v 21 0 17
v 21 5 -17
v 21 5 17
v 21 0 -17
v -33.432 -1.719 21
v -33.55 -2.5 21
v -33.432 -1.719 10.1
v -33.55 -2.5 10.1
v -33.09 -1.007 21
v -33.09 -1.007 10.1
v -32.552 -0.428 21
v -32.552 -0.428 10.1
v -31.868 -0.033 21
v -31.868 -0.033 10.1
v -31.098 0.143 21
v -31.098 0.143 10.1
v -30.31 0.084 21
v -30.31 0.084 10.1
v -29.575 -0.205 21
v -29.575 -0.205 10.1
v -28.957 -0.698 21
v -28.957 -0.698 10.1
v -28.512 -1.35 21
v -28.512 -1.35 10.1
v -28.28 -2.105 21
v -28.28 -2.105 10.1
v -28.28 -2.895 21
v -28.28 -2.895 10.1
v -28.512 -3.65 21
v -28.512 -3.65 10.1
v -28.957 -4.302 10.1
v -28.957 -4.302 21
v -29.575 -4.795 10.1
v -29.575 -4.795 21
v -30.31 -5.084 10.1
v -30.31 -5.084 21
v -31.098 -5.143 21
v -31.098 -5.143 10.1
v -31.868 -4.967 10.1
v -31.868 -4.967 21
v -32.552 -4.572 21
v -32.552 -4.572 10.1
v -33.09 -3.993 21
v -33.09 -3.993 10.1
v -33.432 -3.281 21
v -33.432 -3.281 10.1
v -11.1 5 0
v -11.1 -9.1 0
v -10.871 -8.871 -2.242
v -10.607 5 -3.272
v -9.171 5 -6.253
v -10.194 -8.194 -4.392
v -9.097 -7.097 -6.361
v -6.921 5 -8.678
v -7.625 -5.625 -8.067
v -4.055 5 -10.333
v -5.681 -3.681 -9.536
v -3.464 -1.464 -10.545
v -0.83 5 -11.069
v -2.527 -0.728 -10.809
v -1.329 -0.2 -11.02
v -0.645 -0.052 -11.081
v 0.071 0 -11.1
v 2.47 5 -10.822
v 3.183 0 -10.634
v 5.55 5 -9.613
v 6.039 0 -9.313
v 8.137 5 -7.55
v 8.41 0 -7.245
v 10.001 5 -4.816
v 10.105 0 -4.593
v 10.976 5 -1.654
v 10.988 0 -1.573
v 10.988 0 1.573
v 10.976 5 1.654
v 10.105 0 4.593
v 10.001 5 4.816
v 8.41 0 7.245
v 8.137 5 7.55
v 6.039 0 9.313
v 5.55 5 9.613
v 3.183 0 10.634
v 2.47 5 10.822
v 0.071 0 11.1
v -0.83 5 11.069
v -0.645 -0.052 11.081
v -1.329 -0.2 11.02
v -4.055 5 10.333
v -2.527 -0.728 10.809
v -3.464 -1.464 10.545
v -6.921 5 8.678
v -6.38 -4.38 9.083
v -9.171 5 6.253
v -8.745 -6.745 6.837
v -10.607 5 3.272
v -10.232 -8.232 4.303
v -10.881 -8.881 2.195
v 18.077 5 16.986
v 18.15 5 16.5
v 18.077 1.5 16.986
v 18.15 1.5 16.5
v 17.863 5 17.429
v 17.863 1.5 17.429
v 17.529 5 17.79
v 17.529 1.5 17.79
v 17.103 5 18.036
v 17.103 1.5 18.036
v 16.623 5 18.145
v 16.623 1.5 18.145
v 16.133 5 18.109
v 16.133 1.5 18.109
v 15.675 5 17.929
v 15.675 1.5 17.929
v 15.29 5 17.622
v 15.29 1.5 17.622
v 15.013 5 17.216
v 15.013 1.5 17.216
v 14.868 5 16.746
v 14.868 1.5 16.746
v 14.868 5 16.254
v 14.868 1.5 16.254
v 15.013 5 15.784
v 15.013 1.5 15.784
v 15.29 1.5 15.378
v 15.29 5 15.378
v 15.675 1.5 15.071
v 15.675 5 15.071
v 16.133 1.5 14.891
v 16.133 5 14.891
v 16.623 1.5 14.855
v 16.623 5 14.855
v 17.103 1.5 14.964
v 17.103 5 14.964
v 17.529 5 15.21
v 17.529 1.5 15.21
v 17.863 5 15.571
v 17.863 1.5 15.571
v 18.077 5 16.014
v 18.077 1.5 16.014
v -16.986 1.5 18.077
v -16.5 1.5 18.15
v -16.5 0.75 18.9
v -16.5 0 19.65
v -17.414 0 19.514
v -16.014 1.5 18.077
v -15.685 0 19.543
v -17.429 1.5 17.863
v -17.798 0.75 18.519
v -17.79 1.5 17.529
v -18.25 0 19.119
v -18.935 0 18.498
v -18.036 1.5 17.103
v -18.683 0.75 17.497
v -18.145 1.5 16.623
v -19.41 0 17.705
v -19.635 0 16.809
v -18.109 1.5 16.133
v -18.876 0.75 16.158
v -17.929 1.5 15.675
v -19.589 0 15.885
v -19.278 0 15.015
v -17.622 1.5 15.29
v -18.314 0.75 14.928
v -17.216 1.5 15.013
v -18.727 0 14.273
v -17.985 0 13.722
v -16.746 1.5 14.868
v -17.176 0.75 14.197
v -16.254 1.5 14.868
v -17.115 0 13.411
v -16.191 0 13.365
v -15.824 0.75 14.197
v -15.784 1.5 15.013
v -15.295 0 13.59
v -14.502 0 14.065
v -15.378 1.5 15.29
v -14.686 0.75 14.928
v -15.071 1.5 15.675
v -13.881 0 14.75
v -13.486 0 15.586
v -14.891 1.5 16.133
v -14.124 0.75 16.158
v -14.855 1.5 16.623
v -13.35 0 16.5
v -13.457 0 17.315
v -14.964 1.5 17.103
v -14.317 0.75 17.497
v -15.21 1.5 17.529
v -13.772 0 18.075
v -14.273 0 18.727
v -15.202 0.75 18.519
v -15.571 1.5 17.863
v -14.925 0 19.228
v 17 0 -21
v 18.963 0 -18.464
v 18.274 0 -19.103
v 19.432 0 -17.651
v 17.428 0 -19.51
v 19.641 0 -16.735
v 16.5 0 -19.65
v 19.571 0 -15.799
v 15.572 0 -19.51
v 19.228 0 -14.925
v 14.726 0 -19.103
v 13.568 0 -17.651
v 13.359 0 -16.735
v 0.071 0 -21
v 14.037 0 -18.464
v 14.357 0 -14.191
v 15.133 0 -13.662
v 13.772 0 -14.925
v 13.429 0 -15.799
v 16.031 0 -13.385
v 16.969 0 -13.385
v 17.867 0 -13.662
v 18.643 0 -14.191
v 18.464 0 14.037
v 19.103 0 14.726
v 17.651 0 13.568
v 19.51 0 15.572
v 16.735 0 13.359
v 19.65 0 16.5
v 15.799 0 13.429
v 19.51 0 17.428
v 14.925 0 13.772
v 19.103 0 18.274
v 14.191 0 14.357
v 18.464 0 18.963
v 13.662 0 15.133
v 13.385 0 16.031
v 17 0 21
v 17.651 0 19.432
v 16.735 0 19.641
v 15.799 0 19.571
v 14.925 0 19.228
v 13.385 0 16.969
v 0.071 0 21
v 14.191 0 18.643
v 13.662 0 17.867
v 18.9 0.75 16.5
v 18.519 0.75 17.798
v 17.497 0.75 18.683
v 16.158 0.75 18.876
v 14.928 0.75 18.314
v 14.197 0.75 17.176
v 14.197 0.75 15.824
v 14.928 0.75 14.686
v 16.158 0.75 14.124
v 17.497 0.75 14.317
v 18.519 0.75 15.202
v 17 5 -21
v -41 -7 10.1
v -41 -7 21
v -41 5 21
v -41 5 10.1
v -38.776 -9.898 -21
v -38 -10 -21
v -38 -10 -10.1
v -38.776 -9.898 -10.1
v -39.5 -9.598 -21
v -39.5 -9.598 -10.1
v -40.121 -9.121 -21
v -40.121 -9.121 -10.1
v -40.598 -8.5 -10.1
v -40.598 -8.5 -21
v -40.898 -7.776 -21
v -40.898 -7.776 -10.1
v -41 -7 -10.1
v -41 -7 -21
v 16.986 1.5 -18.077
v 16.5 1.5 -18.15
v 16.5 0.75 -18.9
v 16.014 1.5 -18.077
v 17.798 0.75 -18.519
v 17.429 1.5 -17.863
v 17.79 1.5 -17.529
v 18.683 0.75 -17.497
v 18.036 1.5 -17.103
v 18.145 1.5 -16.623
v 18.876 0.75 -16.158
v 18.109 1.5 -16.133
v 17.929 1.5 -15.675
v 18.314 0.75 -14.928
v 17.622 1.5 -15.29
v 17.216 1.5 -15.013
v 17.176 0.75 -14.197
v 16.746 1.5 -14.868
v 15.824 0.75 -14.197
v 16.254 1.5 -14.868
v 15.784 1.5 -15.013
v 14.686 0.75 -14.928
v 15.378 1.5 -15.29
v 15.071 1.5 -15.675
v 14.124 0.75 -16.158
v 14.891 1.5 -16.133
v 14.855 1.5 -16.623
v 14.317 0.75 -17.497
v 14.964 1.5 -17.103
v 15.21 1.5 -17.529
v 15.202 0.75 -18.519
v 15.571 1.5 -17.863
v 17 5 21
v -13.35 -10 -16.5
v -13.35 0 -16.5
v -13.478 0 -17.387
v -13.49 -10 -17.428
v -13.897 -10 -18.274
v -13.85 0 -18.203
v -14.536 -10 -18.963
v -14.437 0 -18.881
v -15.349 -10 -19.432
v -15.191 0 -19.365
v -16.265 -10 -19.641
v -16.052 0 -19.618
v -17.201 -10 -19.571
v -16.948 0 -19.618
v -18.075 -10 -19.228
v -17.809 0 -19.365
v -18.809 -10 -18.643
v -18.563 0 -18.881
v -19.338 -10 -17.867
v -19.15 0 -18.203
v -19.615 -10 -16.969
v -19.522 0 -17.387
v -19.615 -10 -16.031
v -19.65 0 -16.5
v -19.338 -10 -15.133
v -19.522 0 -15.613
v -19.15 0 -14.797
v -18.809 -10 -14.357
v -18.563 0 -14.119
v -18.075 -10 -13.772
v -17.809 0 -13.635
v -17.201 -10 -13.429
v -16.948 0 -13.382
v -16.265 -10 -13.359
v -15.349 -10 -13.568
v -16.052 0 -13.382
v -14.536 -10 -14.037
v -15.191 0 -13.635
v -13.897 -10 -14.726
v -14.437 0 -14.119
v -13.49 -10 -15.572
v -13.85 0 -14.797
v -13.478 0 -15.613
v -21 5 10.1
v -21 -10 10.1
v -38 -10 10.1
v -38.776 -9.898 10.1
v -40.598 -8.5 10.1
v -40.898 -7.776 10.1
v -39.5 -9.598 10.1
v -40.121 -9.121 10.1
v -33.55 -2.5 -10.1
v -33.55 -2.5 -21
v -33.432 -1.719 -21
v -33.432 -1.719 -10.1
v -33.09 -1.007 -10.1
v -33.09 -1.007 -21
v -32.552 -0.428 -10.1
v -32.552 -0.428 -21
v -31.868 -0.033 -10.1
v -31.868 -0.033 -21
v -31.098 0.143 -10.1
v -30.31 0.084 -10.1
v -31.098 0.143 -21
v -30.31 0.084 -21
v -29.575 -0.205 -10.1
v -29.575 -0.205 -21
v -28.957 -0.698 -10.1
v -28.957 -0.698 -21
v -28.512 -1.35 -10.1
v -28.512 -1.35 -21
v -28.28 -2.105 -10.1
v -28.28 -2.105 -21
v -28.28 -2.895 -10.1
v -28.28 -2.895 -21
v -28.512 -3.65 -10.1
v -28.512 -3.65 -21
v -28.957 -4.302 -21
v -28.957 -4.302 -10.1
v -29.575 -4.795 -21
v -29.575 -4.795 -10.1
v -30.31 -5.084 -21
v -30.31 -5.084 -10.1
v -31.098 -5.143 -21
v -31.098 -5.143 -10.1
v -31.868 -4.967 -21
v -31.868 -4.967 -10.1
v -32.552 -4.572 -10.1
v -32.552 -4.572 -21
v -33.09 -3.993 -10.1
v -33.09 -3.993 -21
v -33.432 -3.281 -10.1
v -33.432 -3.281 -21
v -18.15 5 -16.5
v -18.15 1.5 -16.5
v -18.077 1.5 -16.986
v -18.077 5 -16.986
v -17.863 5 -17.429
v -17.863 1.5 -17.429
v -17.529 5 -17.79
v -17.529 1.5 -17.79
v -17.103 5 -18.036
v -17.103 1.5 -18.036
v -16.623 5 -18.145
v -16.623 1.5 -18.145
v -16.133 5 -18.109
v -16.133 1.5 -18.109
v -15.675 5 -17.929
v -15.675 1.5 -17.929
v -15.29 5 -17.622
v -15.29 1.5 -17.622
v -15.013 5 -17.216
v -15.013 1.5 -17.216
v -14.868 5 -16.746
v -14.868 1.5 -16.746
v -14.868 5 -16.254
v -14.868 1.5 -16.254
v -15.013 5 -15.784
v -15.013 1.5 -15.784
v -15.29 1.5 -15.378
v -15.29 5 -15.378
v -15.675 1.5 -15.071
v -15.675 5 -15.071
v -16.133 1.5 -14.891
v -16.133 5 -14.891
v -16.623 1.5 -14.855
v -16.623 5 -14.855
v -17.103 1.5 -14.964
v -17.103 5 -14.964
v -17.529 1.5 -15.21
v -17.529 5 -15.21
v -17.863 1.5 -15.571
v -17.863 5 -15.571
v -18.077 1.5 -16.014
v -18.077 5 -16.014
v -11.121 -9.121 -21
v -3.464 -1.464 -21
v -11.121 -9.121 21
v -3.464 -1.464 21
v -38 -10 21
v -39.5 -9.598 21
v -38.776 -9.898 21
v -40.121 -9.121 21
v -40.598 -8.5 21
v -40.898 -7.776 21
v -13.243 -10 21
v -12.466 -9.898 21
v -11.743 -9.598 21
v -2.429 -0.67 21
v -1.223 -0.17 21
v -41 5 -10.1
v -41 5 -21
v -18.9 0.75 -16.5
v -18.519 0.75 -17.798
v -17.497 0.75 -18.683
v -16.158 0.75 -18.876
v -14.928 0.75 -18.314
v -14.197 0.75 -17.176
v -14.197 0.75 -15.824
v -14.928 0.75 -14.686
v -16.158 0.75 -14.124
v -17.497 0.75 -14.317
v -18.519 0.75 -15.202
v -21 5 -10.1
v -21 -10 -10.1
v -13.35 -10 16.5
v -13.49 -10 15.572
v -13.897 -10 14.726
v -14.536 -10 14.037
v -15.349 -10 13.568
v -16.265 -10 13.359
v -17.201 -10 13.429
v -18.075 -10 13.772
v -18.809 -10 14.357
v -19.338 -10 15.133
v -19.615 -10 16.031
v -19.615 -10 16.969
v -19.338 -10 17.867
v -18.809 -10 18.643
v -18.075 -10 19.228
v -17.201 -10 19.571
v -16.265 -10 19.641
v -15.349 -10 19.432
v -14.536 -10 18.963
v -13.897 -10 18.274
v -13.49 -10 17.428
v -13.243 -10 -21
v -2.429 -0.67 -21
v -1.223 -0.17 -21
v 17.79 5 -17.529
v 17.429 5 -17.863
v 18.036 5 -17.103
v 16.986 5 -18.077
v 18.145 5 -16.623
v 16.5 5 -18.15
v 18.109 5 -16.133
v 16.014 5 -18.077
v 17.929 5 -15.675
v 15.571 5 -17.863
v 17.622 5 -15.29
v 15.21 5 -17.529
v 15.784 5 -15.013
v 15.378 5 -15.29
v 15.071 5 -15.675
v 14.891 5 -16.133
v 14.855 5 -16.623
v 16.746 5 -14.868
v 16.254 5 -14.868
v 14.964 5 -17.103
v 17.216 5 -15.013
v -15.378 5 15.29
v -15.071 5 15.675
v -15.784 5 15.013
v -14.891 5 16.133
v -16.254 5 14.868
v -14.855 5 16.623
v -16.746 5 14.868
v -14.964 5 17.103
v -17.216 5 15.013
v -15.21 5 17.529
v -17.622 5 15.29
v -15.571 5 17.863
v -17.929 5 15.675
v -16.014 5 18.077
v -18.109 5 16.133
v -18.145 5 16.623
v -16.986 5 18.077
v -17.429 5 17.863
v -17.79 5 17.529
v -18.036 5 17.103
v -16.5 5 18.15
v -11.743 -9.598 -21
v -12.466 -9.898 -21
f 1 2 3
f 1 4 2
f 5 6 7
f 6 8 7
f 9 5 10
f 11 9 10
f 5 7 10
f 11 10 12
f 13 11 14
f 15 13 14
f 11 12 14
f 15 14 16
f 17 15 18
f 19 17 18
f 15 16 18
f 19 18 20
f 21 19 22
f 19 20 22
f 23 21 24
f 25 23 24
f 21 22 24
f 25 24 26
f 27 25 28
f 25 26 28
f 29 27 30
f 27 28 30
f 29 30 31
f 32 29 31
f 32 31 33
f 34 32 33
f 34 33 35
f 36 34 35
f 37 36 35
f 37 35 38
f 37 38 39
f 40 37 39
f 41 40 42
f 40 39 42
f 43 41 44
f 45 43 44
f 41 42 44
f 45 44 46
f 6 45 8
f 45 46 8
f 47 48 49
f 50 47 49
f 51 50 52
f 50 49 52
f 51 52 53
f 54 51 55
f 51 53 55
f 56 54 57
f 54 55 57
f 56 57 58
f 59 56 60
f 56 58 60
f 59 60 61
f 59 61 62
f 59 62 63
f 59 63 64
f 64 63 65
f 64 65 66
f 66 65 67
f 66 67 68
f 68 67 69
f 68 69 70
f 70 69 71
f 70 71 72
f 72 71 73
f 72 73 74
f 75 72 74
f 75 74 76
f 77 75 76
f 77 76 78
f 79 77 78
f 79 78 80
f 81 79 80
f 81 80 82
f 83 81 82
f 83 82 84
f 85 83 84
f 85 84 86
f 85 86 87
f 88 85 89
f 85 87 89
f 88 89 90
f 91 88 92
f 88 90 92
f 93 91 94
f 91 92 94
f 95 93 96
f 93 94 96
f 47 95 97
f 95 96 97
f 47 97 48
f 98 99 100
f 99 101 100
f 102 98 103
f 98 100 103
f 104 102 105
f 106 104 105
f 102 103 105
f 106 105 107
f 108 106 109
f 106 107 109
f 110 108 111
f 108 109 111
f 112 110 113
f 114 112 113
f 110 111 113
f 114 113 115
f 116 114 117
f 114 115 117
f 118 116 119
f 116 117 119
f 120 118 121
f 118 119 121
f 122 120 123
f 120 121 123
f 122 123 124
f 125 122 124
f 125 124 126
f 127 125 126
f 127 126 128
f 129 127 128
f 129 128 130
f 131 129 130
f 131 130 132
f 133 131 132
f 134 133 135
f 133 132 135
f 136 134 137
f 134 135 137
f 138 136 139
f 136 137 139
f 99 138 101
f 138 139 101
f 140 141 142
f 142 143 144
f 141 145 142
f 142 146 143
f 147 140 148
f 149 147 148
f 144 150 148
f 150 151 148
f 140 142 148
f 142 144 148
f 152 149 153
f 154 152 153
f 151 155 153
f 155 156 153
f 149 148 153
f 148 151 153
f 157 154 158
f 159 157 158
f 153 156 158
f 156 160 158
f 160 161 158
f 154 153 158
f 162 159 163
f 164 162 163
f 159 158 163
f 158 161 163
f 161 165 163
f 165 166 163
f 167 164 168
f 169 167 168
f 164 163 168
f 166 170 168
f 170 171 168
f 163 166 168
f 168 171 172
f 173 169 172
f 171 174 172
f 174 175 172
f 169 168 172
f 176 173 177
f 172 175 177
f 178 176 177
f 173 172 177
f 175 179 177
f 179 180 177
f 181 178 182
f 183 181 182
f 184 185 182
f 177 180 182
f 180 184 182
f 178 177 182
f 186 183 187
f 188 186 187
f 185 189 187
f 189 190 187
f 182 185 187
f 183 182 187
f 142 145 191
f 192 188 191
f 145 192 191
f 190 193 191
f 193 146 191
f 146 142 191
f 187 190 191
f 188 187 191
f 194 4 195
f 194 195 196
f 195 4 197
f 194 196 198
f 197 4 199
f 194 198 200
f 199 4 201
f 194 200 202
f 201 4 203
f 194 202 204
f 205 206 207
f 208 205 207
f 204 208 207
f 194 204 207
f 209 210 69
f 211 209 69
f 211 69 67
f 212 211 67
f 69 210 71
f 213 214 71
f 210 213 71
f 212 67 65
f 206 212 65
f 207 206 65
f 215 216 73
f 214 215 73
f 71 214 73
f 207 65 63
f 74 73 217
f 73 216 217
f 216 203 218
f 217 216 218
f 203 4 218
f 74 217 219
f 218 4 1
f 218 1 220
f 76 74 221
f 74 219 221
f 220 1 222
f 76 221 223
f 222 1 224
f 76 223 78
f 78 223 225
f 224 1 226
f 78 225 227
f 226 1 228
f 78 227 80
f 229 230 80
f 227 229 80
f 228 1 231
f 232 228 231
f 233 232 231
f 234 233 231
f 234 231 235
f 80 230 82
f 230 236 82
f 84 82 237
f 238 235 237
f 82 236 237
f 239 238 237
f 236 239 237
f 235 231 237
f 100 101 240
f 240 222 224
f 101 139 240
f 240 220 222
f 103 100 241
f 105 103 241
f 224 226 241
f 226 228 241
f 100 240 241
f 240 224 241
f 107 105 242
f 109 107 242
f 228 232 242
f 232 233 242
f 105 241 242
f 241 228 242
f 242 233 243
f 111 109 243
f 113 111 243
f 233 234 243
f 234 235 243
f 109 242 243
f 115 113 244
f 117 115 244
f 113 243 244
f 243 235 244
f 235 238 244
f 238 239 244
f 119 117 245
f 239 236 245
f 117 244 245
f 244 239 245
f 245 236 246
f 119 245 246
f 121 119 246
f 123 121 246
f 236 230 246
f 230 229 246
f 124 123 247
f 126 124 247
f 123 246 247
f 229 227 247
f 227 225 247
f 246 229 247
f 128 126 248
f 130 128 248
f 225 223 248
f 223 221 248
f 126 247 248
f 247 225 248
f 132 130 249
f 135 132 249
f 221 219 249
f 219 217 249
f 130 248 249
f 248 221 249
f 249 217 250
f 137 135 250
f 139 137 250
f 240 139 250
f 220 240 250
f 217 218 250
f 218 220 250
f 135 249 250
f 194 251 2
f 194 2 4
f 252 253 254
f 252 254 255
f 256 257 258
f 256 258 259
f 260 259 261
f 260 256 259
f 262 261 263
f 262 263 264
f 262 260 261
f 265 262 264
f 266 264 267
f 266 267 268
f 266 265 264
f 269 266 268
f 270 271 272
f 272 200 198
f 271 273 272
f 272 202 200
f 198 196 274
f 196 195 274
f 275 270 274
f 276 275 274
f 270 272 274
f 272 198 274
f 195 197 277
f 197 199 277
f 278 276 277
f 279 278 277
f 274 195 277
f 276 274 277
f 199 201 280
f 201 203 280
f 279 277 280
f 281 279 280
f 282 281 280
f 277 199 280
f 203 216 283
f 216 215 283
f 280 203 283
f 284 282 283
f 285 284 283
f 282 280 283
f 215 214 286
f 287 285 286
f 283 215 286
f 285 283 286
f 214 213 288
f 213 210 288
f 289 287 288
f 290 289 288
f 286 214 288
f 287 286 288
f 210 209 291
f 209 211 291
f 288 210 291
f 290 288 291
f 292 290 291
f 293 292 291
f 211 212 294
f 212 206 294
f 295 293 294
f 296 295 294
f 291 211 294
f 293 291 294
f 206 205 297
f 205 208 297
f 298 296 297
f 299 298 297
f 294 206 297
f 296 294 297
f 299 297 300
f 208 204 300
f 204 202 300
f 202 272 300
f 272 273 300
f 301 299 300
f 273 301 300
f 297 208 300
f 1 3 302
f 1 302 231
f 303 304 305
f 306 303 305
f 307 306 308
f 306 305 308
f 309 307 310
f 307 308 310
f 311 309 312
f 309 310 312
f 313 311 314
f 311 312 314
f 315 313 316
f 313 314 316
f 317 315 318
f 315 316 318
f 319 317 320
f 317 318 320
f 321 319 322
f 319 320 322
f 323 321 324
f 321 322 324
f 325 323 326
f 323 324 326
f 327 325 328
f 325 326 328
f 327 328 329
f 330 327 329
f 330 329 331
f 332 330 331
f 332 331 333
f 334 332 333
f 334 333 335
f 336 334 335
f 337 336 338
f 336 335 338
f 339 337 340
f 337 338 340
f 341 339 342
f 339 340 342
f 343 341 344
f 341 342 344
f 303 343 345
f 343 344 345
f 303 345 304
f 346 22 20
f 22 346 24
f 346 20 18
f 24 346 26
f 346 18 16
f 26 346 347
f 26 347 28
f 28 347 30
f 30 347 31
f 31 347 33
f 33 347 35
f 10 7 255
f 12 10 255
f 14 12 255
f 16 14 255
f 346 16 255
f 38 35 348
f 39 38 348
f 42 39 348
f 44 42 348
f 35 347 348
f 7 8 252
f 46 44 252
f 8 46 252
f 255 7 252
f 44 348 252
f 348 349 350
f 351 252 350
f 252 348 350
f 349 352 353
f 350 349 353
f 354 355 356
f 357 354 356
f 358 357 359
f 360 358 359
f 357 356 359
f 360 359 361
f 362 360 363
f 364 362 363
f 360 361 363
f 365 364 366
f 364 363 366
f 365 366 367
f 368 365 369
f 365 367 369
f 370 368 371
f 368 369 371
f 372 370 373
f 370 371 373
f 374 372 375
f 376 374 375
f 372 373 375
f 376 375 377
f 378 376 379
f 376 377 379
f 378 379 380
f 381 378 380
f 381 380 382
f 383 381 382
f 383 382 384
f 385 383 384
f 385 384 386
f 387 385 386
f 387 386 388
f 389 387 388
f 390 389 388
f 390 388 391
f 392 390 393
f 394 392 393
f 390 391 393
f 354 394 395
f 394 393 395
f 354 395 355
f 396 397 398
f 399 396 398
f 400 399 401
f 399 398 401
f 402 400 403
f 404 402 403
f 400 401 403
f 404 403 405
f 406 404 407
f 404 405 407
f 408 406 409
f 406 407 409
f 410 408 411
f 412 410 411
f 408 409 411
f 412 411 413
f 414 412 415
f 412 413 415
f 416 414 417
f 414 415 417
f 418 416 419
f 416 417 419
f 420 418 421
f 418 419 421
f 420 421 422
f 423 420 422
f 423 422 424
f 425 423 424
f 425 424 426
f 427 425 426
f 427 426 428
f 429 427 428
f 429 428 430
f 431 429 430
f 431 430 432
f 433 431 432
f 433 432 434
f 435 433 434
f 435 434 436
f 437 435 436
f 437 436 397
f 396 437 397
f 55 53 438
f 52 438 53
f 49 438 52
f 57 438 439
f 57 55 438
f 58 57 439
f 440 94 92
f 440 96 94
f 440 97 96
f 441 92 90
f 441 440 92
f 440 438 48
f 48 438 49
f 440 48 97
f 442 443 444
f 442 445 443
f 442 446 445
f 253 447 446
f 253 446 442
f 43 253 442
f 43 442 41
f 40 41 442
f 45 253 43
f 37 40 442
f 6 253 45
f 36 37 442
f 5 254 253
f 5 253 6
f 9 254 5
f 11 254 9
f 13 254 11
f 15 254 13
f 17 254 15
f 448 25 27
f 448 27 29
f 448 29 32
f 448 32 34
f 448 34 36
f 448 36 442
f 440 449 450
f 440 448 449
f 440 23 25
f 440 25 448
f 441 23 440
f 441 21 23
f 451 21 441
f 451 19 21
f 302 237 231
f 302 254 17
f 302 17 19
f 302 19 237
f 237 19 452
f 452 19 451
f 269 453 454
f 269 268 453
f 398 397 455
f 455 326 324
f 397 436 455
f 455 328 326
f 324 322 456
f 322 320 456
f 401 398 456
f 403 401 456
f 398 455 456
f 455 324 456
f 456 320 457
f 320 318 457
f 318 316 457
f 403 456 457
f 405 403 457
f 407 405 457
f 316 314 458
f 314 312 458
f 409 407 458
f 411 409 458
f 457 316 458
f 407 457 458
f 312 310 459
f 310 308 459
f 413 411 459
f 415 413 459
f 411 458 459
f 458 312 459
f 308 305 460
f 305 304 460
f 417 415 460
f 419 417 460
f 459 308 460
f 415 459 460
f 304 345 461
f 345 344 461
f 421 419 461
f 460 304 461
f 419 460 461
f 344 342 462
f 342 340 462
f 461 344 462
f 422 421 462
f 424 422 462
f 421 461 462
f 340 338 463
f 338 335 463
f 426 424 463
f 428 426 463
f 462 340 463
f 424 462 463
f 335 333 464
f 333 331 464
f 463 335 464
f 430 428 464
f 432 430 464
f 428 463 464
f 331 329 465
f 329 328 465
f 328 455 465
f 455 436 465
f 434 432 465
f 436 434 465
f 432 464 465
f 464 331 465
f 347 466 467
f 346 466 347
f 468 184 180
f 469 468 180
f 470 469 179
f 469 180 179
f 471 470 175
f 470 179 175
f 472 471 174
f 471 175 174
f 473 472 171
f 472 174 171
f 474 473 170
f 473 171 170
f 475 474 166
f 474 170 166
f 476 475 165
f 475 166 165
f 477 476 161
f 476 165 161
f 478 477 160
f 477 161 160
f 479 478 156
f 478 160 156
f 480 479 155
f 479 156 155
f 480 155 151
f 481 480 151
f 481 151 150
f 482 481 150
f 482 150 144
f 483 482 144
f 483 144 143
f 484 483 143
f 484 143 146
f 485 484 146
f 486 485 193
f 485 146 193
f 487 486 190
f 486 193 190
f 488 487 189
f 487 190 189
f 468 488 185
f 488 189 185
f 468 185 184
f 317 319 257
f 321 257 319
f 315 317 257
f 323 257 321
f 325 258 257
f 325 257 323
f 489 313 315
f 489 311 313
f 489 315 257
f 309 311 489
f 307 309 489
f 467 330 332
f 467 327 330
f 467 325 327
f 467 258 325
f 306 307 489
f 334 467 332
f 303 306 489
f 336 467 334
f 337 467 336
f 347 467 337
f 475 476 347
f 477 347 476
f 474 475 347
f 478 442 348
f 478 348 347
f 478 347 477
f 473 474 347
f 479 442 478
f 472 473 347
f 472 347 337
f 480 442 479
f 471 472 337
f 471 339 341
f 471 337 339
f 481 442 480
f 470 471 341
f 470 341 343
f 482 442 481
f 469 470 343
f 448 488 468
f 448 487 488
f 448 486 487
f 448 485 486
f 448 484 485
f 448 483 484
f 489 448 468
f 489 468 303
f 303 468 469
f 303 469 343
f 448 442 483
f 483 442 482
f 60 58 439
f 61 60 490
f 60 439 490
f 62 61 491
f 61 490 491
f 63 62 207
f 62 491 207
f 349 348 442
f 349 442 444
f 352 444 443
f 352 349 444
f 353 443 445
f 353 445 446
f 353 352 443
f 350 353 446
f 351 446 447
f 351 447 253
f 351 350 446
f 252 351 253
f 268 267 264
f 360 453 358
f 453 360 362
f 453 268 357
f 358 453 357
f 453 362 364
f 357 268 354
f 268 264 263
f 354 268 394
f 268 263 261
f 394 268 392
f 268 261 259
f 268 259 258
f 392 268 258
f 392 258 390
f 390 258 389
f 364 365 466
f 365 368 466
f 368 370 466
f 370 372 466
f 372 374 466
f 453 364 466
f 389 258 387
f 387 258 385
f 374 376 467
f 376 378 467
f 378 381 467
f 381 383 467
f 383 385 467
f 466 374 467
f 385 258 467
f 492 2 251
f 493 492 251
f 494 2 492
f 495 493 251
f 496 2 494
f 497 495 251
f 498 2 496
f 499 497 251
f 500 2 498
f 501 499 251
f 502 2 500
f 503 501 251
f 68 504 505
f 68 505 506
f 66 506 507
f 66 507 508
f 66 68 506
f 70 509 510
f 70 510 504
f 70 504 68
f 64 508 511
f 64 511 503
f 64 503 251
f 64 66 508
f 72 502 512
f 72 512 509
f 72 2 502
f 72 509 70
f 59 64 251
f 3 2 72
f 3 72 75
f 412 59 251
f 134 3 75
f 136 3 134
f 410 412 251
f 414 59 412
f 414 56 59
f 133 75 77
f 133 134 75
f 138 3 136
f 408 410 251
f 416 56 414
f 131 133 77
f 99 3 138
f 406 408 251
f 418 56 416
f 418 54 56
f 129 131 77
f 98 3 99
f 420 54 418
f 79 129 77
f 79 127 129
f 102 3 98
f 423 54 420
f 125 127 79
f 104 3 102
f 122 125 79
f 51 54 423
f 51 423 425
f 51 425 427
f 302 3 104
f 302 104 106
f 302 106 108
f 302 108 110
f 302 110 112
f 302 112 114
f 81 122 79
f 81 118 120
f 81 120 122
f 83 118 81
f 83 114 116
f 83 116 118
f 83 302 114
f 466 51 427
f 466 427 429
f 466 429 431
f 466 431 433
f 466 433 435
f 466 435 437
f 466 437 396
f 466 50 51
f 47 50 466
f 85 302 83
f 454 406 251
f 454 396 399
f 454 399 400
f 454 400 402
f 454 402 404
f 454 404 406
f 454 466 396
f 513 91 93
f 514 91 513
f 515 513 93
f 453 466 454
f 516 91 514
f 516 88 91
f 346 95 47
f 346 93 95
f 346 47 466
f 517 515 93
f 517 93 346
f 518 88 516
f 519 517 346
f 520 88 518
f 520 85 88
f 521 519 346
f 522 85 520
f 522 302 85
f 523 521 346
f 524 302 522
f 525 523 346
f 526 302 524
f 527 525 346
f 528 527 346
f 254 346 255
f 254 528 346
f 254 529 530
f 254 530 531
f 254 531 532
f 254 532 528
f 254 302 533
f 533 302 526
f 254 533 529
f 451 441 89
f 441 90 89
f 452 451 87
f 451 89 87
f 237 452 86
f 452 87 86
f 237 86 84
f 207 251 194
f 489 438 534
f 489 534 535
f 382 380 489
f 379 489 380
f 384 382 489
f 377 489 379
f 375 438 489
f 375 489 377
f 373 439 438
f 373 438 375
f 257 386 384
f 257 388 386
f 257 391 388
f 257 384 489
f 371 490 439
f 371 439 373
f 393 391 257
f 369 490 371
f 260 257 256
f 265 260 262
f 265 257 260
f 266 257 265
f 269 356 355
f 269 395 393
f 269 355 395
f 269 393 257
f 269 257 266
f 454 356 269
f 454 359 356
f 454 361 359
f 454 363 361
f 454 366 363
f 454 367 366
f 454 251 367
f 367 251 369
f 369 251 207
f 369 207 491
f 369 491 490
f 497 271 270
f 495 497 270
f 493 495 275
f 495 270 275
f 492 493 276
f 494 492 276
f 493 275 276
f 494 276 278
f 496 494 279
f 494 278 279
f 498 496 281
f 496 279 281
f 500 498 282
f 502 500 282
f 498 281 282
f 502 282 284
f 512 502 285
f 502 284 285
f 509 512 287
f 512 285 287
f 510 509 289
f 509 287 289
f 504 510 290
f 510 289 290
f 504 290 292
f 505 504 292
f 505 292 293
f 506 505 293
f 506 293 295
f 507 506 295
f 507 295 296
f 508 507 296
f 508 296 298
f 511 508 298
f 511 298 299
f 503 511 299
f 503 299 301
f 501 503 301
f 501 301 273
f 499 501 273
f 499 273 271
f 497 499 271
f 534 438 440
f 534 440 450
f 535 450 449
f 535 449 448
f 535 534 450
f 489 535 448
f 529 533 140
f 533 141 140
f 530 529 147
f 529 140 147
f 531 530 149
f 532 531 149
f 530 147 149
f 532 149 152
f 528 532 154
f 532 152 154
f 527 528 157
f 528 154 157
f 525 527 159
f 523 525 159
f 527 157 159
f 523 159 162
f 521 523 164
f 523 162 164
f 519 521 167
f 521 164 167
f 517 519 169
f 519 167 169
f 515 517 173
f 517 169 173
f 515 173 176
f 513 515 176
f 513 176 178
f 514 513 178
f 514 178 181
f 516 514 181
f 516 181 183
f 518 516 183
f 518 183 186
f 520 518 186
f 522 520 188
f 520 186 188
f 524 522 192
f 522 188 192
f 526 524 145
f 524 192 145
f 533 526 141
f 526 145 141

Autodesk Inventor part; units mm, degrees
ref_plane "YZ Plane" through (0, 0, 0) normal (1, 0, 0) x (0, 1, 0)
ref_plane "XZ Plane" through (0, 0, 0) normal (0, 1, 0) x (-1, 0, 0)
ref_plane "XY Plane" through (0, 0, 0) normal (0, 0, 1) x (1, 0, 0)
sketch "Boceto1" plane through (0, 0, 0) normal (0, 1, 0) x (-1, 0, 0)
  line L0 (-21, 21) -> (21, 21)
  line L1 (21, 21) -> (21, -21)
  line L2 (21, -21) -> (-21, -21)
  line L3 (-21, -21) -> (-21, 21)
  line L4 (-21, 21) -> (21, -21) construction
  line L5 (21, 21) -> (-21, -21) construction
  circle A0 centre (0, 0) radius 11.1
  dimension "d0" = 42
  dimension "d1" = 42
  dimension "d2" = 22.2
extrude "Extrusión1" add sketch "Boceto1" along normal blind 5
sketch "Boceto3" plane through (0, 0, 0) normal (0, -1, 0) x (1, 0, 0)
  circle A0 centre (16.5, 16.5) radius 1.65
  point P0 (0, 0)
  dimension "d9" = 3.3
  dimension "d10" = 16.5
  dimension "d11" = 16.5
extrude "Extrusión3" cut sketch "Boceto3" against normal through all
chamfer "Chaflán1" distance 1.5 angle 45 1 edges at (14.85, 0, 16.5)
pattern_circular "Patrón circular1" count 4 over 360 about axis through (0, 0, 0) along (0, 1, 0) of "Extrusión3", "Chaflán1"
chamfer "Chaflán3" distance 4 angle 45 2 edges at (21, 2.5, -21) (21, 2.5, 21)
sketch "Boceto4" plane through (0, 0, 0) normal (0, -1, 0) x (1, 0, 0)
  circle A0 centre (-16.5, 16.5) radius 3.15 projected
  circle A1 centre (-16.5, 16.5) radius 1.65 projected
  circle A2 centre (-16.5, -16.5) radius 1.65 projected
  circle A3 centre (-16.5, -16.5) radius 3.15 projected
  line L0 (-21, -21) -> (-21, 21) projected
  line L1 (17, -21) -> (-21, -21) projected
  line L2 (-21, 21) -> (-12, 21)
  line L3 (-12, 21) -> (-12, -21)
  line L4 (-12, -21) -> (-21, -21)
  line L5 (-21, -21) -> (-21, 21)
  point P0 (0, 0)
  dimension "d27" = 9
extrude "Extrusión4" add sketch "Boceto4" along normal blind 10 contours L0 L2 L3 L1
sketch "Boceto5" plane through (0, -10, 0) normal (0, -1, 0) x (1, 0, 0)
  line L0 (-21, -21) -> (-21, 21) projected
  line L1 (-21, 21) -> (-41, 21)
  line L2 (-41, 21) -> (-41, -21)
  line L3 (-41, -21) -> (-21, -21)
  line L4 (-21, -21) -> (-21, 21)
  line L5 (-21, 10.1) -> (-41, 10.1)
  line L6 (-41, 10.1) -> (-41, -10.1)
  line L7 (-41, -10.1) -> (-21, -10.1)
  line L8 (-21, -10.1) -> (-21, 10.1)
  line L9 (-31, 10.1) -> (-31, 21)
  line L10 (-31, -10.1) -> (-31, -21)
  line L11 (-21, -21) -> (-12, -21) projected
  point P0 (0, 0)
  dimension "d30" = 20.2
  dimension "d31" = 20
extrude "Extrusión5" add sketch "Boceto5" against normal up to surface (15 mm away) contours L3 L10 L7 L0 | L3 L2 L7 L10 | L5 L9 L1 L0 | L5 L2 L1 L9
chamfer "Chaflán4" distance 10 angle 45 1 edges at (-12, 0, 0)
fillet "Empalme2" radius 5 2 edges at (-2, 0, -15.9592) (-2, 0, 15.9592)
fillet "Empalme3" radius 3 1 edges at (-12, -10, 0)
fillet "Empalme4" radius 3 2 edges at (-41, -10, 15.55) (-41, -10, -15.55)
sketch "Boceto6" plane through (17, 0, -21) normal (0, 0, -1) x (-1, 0, 0)
  circle A0 centre (47.9, -2.5) radius 2.65
  line L0 (0, 5) -> (58, 5) projected
  line L1 (58, -7) -> (58, 5) projected
  point P0 (17, 0)
  dimension "d40" = 7.5
  dimension "d41" = 10.1
  dimension "d42" = 5.3
extrude "Extrusión6" cut sketch "Boceto6" against normal through all
properties part number "Zmotorsupport"
